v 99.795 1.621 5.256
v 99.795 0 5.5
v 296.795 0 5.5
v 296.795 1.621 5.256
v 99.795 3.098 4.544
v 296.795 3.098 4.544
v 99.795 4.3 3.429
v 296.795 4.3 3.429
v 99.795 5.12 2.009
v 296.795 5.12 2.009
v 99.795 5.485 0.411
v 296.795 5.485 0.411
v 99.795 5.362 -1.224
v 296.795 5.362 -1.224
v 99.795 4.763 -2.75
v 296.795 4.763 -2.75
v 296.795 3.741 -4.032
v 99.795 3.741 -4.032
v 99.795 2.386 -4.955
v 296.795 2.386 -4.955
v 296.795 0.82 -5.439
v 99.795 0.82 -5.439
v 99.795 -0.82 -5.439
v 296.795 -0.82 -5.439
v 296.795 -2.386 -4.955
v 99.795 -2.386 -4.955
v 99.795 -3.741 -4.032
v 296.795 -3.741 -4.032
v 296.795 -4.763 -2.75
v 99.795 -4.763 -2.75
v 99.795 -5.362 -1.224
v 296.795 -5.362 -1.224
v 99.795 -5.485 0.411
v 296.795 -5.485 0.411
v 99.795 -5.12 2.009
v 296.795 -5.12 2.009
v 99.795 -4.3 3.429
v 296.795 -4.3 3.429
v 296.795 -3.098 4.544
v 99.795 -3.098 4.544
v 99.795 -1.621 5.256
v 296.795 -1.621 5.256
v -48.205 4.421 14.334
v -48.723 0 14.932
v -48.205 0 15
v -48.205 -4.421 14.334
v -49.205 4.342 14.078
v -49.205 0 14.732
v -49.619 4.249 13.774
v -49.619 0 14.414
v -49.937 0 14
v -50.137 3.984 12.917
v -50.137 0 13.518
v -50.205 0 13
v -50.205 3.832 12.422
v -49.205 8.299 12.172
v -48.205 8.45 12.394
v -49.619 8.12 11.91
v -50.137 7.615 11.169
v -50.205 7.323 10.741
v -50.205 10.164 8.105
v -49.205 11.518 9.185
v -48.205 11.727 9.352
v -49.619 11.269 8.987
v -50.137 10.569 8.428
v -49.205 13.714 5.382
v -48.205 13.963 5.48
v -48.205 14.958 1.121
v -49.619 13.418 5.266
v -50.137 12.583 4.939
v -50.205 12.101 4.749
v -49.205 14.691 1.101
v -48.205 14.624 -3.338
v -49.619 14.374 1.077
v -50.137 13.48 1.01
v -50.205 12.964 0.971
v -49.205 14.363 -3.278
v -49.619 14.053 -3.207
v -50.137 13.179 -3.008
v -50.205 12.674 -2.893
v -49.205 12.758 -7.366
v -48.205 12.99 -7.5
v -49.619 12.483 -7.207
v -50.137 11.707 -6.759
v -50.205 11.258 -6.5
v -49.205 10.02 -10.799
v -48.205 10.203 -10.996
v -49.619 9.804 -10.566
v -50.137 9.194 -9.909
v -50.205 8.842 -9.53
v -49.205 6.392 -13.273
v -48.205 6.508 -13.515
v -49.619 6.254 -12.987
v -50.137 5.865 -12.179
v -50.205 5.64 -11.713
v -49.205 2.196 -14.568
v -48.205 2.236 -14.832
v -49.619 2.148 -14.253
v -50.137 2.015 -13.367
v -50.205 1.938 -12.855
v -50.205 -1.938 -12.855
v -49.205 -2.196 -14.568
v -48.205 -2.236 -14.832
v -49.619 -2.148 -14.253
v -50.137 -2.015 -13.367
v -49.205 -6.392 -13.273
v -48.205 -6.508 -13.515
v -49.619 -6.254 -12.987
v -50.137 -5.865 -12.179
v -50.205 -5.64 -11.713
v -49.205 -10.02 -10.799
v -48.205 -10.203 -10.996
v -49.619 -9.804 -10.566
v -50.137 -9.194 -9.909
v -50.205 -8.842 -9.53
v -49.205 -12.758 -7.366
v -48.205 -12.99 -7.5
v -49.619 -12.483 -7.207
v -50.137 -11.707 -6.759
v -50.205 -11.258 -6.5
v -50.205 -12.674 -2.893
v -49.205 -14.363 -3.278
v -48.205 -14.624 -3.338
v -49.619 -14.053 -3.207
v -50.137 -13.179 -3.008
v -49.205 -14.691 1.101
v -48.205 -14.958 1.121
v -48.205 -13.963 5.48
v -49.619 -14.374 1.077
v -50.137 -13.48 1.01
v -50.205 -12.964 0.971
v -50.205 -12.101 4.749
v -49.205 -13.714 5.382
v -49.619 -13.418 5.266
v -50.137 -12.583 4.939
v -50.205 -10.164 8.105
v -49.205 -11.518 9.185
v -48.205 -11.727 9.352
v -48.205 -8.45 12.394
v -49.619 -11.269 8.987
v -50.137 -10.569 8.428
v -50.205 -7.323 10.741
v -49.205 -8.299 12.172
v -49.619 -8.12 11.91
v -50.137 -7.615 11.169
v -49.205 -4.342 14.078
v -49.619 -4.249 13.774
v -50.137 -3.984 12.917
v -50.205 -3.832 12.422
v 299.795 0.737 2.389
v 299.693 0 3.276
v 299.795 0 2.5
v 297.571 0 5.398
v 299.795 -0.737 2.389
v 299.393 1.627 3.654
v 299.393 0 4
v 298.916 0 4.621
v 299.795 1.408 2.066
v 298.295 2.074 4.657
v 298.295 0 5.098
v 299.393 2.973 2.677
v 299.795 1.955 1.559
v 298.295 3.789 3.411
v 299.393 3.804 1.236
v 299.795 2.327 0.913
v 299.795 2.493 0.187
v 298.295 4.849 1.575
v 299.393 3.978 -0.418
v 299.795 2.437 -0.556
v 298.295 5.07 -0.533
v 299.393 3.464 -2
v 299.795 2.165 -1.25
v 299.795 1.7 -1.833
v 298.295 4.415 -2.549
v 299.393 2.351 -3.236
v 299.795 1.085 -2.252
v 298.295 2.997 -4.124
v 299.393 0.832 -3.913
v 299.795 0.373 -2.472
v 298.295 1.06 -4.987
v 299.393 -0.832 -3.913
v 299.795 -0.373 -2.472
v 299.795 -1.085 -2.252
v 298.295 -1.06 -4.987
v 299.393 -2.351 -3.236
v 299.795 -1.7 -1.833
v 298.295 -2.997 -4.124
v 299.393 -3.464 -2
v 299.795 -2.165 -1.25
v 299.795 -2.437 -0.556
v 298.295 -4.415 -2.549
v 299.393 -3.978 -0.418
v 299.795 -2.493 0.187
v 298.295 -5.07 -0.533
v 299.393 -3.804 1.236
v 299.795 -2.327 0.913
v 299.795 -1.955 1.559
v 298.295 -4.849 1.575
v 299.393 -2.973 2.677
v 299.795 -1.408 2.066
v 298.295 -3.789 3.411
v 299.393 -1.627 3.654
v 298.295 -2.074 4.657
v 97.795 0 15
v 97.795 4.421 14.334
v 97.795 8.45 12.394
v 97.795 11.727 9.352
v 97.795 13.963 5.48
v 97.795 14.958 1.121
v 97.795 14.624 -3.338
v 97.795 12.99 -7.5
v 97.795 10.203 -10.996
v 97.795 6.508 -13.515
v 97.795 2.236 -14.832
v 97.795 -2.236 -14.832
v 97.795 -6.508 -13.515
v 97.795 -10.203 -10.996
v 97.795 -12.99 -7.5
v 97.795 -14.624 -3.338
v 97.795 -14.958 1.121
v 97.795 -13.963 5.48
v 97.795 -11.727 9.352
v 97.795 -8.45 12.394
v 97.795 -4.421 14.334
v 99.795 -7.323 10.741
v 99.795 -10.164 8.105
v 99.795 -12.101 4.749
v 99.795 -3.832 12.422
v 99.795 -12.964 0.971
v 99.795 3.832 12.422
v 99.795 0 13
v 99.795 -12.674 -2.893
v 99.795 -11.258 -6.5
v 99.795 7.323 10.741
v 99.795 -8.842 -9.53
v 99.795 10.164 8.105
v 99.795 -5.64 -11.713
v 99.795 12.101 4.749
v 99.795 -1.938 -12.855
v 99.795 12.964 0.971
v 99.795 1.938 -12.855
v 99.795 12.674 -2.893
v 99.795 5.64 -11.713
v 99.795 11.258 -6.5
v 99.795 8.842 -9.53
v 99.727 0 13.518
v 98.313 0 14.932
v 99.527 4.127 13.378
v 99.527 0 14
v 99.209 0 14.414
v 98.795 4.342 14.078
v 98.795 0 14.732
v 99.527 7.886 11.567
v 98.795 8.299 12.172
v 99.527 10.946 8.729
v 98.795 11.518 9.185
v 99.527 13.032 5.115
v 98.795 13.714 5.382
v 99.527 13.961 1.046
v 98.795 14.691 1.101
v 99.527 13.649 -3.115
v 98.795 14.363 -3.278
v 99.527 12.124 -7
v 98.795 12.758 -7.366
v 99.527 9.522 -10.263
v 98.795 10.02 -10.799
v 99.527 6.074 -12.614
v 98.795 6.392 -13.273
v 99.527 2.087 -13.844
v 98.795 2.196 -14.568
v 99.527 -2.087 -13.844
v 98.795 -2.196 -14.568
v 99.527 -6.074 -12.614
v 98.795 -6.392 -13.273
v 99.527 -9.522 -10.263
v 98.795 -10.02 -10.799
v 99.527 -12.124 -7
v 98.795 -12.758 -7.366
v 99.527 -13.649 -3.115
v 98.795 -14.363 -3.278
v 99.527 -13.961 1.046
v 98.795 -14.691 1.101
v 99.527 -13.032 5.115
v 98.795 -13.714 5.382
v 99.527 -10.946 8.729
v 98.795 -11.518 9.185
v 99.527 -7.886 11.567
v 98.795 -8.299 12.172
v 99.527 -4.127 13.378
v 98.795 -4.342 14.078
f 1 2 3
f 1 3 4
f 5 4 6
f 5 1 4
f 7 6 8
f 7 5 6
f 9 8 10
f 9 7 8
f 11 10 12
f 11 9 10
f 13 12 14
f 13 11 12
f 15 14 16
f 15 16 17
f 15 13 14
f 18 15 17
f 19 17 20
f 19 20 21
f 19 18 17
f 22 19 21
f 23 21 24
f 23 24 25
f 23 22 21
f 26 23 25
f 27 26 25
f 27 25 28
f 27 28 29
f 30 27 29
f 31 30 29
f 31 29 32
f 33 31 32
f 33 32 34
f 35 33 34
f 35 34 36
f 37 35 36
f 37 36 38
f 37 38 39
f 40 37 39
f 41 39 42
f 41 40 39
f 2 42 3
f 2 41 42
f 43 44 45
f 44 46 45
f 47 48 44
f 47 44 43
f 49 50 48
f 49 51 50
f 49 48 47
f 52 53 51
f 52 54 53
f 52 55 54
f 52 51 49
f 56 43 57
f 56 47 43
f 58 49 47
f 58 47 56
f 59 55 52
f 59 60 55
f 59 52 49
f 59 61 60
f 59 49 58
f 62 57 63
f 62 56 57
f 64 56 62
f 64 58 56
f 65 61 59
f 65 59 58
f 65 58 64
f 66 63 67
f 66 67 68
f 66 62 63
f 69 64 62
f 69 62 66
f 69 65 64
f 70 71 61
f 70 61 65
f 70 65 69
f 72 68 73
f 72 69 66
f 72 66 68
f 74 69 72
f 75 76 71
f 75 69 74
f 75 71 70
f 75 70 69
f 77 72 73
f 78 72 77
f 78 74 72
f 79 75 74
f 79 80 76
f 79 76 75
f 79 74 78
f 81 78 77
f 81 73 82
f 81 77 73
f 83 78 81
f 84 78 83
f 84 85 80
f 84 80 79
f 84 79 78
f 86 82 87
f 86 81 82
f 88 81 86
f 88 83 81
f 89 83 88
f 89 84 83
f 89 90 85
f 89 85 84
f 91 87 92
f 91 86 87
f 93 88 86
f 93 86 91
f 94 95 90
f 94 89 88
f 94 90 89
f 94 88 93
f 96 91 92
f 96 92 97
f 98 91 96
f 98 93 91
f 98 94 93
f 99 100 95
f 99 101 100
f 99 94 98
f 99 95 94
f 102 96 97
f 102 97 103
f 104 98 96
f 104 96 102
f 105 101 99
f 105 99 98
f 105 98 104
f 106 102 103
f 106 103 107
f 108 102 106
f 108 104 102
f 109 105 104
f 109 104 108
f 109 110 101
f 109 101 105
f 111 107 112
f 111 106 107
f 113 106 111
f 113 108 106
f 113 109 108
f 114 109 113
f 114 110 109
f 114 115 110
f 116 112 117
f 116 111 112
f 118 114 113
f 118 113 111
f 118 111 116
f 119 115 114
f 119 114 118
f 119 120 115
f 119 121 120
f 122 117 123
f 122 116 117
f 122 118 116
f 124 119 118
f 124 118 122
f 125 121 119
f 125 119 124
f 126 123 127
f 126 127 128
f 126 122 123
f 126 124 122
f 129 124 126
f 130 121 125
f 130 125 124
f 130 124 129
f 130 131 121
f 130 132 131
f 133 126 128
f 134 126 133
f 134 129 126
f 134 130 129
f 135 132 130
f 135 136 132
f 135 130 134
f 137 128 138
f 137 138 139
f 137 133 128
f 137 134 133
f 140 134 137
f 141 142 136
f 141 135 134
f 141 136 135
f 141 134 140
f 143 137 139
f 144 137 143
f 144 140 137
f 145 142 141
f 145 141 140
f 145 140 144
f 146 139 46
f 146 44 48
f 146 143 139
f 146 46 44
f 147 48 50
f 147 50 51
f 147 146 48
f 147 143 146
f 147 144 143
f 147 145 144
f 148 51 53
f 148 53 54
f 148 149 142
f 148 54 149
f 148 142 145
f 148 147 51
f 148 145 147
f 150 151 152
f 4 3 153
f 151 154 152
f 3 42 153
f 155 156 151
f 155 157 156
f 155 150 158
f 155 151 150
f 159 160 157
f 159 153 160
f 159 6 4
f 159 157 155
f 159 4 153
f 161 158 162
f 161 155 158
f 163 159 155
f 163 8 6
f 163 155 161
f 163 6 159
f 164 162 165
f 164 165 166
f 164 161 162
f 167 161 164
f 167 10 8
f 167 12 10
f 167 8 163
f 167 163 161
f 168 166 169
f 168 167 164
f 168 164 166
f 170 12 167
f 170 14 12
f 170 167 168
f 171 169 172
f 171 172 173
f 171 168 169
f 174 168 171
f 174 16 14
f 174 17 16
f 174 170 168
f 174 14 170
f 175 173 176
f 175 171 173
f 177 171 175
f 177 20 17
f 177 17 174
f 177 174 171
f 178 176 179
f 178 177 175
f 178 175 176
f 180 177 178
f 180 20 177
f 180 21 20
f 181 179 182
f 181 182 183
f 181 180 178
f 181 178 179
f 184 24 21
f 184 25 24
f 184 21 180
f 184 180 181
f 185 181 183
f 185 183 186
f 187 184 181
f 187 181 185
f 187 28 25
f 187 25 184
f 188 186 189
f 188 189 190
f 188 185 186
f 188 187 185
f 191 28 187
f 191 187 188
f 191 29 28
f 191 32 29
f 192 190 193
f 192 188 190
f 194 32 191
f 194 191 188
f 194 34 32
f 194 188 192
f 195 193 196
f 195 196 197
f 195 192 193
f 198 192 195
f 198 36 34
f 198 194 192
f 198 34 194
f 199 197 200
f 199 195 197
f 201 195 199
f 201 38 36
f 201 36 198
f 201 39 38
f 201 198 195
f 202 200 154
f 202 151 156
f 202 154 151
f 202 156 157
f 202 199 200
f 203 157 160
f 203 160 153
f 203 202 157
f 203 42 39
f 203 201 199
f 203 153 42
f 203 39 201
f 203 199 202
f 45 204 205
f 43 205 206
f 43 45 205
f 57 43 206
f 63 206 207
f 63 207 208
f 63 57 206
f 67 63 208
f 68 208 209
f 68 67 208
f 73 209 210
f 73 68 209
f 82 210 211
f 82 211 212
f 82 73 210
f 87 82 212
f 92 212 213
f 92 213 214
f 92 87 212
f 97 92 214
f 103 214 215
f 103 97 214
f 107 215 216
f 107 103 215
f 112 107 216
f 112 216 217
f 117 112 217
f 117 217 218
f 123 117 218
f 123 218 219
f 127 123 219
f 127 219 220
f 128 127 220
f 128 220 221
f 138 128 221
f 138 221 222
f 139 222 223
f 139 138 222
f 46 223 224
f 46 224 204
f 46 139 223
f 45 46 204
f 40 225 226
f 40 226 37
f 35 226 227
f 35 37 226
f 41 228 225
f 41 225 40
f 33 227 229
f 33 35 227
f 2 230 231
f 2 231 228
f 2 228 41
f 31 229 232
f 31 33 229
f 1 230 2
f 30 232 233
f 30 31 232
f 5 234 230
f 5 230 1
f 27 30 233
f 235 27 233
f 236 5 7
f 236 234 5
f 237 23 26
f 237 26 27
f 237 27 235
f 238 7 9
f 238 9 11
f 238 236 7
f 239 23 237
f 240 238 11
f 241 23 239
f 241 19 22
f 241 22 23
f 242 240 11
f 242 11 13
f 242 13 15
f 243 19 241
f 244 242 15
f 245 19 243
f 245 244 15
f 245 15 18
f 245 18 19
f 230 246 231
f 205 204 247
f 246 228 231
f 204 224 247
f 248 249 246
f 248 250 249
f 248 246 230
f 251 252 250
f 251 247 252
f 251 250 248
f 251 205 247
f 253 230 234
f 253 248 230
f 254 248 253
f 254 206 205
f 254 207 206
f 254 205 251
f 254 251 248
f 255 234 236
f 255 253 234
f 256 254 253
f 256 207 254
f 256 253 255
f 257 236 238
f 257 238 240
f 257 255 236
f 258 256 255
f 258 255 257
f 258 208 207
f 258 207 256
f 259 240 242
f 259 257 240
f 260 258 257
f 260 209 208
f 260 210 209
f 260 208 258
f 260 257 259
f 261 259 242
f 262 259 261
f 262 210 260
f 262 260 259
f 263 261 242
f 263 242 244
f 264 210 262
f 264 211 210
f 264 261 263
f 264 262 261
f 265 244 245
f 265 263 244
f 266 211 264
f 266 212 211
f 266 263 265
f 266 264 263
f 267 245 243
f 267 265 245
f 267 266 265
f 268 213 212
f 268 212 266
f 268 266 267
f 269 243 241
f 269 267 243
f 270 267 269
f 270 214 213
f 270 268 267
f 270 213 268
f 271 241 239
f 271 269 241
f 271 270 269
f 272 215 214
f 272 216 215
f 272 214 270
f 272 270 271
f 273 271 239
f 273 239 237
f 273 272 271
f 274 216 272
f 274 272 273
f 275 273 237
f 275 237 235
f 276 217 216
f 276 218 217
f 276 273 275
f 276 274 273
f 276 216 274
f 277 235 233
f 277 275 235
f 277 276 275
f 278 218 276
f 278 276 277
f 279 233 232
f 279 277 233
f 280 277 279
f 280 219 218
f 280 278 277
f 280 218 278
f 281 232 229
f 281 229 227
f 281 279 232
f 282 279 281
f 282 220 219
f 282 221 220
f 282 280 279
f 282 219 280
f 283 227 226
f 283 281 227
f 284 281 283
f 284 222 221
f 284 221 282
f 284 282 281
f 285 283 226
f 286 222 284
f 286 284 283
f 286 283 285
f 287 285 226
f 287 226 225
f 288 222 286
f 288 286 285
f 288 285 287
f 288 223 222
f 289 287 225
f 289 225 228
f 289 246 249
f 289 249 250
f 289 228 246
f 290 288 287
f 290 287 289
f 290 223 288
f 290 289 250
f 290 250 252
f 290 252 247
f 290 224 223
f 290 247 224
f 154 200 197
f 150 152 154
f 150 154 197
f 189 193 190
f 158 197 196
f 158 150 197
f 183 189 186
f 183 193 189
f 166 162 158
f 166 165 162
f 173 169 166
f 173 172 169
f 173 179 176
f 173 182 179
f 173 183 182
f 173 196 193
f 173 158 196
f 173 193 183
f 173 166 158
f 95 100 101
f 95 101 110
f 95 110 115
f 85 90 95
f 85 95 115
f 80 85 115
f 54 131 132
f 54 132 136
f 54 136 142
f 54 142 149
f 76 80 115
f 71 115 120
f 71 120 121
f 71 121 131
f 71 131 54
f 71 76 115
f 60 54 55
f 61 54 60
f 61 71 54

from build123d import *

# Parameters (mm, degrees)
F2_R = 3
F3_R = 2


with BuildPart() as f1:
    # F0 (on Front) → F1 (revolve)
    with BuildSketch(Plane.XZ):
        Polygon((-50.205132, 15), (-50.205132, 0), (299.794868, 0), (299.794868, 5.5), (99.794868, 5.5), (99.794868, 15), align=None)
    revolve(axis=Axis((124.794868, 0, 0), (-1, 0, 0)))

    # F2
    f2_edges = [f1.edges().sort_by_distance(p)[0] for p in [
        (299.794868, 0, -5.5),
    ]]
    fillet(f2_edges, radius=F2_R)

    # F3
    f3_edges = [f1.edges().sort_by_distance(p)[0] for p in [
        (99.794868, 0, -15),
        (-50.205132, 0, -15),
    ]]
    fillet(f3_edges, radius=F3_R)


solid = f1.part
